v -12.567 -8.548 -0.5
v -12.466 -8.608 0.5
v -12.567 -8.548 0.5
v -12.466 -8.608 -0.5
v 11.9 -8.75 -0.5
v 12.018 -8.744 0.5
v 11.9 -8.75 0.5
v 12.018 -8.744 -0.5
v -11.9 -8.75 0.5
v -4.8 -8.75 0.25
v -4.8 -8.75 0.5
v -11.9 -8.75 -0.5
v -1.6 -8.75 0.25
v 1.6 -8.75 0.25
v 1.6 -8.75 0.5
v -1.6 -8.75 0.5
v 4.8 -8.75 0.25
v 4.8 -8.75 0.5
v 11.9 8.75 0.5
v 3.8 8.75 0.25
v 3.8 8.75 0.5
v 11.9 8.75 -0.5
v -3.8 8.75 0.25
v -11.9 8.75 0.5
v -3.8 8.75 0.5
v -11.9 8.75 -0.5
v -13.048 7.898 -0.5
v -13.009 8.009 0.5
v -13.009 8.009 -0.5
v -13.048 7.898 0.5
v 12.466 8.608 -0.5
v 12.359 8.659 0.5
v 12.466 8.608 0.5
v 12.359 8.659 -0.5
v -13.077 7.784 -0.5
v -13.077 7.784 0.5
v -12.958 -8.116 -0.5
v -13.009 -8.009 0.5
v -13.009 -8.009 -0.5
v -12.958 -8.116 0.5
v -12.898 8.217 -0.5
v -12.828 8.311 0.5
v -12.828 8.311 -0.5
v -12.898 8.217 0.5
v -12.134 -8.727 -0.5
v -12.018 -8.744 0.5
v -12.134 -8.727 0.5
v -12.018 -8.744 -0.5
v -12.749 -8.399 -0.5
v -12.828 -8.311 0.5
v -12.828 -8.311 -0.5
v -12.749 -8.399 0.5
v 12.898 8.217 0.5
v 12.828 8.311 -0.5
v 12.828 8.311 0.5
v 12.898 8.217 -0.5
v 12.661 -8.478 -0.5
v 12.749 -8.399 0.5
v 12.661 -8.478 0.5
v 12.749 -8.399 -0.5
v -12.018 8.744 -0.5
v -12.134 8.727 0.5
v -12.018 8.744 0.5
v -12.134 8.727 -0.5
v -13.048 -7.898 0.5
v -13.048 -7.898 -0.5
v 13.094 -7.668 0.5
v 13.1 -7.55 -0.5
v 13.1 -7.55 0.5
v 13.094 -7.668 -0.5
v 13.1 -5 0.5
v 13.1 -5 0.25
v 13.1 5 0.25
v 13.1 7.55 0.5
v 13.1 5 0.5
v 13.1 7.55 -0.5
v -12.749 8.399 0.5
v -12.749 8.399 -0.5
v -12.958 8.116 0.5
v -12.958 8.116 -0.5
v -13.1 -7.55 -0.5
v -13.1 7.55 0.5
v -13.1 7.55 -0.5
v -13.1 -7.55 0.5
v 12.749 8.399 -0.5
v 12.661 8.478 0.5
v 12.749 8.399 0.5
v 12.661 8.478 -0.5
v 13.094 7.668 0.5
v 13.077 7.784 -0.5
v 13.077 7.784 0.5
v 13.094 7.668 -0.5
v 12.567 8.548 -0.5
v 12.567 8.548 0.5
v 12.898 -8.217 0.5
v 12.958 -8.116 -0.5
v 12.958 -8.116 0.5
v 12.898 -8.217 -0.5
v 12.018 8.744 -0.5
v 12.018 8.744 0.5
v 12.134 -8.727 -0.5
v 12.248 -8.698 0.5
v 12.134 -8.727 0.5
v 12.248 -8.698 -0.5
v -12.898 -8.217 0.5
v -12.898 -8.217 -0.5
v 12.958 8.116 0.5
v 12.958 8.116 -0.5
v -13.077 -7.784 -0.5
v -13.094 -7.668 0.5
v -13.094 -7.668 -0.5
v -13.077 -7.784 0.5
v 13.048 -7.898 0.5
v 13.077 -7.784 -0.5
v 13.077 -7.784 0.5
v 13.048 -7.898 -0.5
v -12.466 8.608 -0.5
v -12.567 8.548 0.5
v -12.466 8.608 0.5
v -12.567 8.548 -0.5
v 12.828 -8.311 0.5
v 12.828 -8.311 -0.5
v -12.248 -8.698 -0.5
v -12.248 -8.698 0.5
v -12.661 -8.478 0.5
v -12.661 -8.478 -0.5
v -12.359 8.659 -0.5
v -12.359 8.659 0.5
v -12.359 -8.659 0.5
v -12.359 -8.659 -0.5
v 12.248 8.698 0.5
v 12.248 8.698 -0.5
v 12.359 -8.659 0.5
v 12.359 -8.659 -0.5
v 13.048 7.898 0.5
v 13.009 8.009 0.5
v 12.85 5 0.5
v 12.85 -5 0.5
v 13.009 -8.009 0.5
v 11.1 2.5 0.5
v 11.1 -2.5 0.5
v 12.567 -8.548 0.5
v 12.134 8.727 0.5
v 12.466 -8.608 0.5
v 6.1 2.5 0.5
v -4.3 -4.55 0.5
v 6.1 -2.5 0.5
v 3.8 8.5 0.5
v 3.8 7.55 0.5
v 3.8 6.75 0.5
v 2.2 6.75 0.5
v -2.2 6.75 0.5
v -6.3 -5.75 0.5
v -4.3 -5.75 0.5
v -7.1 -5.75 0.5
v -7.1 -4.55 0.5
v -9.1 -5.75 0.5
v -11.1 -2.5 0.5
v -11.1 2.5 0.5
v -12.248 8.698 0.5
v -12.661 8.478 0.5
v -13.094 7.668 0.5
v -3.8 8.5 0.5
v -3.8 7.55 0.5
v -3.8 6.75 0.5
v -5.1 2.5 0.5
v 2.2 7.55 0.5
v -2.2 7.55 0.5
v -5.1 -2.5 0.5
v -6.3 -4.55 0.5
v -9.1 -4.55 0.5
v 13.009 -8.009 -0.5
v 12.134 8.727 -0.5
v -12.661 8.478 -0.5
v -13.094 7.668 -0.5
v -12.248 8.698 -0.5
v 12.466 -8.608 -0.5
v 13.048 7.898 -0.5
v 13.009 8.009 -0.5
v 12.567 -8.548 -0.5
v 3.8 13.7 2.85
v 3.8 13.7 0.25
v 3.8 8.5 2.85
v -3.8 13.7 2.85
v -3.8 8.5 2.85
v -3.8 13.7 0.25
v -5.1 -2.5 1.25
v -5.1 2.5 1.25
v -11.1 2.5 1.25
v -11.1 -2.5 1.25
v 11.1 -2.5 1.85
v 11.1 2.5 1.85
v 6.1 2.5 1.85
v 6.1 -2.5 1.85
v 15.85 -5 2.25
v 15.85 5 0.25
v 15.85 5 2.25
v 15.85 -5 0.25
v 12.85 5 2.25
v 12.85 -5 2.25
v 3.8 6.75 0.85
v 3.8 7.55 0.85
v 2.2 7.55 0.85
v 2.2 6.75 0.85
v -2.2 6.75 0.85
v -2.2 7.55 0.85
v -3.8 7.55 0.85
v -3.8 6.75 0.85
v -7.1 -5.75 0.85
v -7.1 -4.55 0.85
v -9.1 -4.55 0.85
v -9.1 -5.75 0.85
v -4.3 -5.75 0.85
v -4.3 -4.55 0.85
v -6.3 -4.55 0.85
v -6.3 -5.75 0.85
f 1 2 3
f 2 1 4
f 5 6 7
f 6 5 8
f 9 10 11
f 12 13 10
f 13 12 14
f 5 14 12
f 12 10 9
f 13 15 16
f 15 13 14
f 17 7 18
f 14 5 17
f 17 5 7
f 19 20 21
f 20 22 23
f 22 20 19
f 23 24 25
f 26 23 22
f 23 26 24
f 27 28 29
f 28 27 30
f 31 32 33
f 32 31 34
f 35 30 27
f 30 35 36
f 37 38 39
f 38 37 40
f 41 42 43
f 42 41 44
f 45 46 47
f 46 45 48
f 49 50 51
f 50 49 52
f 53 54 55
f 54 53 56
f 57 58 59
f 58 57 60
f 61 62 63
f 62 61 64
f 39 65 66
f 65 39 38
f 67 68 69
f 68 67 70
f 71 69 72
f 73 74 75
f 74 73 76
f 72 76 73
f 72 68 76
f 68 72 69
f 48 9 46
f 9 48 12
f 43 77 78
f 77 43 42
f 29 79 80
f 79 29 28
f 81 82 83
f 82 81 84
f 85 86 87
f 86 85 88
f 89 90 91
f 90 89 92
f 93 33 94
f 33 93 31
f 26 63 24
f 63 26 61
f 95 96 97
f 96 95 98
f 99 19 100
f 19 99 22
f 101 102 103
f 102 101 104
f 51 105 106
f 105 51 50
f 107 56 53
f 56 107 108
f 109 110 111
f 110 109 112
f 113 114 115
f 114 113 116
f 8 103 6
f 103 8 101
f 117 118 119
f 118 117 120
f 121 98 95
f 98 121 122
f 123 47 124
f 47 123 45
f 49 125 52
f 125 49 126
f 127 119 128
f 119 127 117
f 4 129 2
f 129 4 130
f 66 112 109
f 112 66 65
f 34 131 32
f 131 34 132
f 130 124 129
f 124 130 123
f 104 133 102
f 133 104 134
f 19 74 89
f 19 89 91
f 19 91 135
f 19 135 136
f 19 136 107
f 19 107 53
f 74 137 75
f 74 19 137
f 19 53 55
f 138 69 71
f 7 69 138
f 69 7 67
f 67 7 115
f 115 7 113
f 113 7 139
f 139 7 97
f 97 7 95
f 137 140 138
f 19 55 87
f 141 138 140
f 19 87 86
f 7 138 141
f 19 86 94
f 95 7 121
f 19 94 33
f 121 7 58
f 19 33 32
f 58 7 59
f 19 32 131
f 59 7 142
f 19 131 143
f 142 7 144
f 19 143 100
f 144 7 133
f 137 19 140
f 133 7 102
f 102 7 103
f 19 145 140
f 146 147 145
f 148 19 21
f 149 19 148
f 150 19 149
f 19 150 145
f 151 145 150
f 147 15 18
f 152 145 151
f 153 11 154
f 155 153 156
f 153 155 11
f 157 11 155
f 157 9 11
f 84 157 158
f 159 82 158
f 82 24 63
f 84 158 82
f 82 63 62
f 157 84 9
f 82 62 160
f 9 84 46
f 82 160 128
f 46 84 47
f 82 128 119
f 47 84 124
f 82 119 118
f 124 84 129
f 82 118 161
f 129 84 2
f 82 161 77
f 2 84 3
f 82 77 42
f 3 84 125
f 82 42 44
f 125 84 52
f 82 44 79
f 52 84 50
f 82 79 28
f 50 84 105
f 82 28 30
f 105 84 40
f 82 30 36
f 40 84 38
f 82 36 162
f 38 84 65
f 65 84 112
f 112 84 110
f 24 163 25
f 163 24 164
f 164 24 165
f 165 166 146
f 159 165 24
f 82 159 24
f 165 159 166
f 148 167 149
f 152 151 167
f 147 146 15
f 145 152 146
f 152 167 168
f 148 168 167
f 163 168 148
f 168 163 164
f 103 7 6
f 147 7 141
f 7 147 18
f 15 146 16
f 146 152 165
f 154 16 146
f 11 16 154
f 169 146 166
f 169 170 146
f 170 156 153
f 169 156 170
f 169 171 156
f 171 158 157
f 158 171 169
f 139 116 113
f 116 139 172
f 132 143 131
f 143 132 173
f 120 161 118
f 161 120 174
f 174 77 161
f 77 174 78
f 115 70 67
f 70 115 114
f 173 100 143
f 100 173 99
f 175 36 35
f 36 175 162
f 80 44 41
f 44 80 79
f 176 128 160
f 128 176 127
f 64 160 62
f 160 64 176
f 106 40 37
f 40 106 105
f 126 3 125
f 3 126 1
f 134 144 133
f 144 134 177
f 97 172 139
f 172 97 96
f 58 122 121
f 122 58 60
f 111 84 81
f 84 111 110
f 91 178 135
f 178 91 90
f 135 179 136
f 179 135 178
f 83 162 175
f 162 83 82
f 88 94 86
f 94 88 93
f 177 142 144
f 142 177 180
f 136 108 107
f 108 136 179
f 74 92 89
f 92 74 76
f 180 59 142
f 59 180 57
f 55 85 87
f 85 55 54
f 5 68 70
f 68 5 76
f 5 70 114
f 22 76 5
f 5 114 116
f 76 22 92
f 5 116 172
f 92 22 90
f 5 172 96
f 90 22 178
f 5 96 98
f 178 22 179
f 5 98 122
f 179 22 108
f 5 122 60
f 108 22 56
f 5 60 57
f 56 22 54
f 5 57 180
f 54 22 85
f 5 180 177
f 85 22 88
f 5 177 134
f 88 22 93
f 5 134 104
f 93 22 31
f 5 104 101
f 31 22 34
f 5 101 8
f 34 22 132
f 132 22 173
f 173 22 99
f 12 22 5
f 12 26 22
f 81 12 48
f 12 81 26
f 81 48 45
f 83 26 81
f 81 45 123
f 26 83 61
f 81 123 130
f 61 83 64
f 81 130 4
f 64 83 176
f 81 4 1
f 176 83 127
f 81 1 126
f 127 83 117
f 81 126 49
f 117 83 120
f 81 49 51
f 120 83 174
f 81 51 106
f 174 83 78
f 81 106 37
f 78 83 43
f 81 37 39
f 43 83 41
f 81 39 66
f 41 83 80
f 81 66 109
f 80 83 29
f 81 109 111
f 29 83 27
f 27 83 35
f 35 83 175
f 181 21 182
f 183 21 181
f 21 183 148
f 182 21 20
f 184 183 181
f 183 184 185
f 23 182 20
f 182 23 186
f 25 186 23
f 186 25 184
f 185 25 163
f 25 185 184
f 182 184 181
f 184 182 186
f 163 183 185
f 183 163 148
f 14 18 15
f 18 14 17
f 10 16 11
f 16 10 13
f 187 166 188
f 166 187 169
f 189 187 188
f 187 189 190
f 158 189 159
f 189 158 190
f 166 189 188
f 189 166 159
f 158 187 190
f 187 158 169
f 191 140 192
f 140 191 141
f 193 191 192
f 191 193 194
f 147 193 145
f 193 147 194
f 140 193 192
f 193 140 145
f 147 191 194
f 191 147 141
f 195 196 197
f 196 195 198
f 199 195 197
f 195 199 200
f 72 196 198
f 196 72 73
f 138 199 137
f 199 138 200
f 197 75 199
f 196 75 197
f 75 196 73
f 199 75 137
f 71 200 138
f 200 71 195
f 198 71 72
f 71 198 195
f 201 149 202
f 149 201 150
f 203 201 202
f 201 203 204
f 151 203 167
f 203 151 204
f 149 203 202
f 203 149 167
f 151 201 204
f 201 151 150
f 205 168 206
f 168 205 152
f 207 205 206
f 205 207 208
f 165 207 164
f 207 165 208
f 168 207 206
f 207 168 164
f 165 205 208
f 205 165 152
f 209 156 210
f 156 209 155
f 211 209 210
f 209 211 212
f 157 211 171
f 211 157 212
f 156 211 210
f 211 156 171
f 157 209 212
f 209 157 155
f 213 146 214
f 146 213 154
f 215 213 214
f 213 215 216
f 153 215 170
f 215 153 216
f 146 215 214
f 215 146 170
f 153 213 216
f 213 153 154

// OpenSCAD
$fn = 64;

// Target overall PCB size (verifiable)
pcb_L = 26.2;
pcb_W = 17.5;
pcb_T = 1.0;

// Connectivity / robustness
corner_r = 1.2;
overlap  = 0.25;   // ensures all features intersect the PCB (one connected solid)

// --- Feature sizes (charger-module cues) ---
usb_W = 7.6;   // micro-USB shell width
usb_D = 5.2;   // protrusion beyond PCB edge
usb_H = 2.6;   // height above PCB

chip_L = 6.0;
chip_W = 5.0;
chip_H = 1.0;

ind_L = 5.0;
ind_W = 5.0;
ind_H = 1.6;

pad_L = 3.2;
pad_W = 2.2;
pad_H = 0.25;

header_L = 10.0;
header_W = 3.0;
header_H = 2.0;

// Extra recognizable details (still connected)
led_L = 1.6;
led_W = 0.8;
led_H = 0.6;

res_L = 2.0;
res_W = 1.2;
res_H = 0.6;

module rounded_pcb(L, W, T, r) {
    // Exact outer size L x W, thickness T
    linear_extrude(height=T, center=true)
        offset(r=r)
            square([L - 2*r, W - 2*r], center=true);
}

module block(sz=[1,1,1]) { cube(sz, center=true); }

module battery_charger_module() {
    union() {
        // PCB body (exact 26.2 x 17.5 x 1.0)
        rounded_pcb(pcb_L, pcb_W, pcb_T, corner_r);

        // Micro-USB-like connector on +Y edge (connected)
        translate([0,
                   pcb_W/2 + usb_D/2 - overlap,
                   pcb_T/2 + usb_H/2 - overlap])
            block([usb_W, usb_D, usb_H]);

        // Small "tongue" inside USB (still one solid; just a cue)
        tongue_W = usb_W * 0.55;
        tongue_D = usb_D * 0.55;
        tongue_H = 0.8;
        translate([0,
                   pcb_W/2 + tongue_D/2 - overlap,
                   pcb_T/2 + tongue_H/2 - overlap])
            block([tongue_W, tongue_D, tongue_H]);

        // 2-pin battery pads on -Y edge (connected)
        pad_y = -(pcb_W/2 - pad_W/2);
        pad_z = pcb_T/2 + pad_H/2 - overlap;
        pad_x_off = 3.2;
        translate([ pad_x_off, pad_y, pad_z]) block([pad_L, pad_W, pad_H]);
        translate([-pad_x_off, pad_y, pad_z]) block([pad_L, pad_W, pad_H]);

        // Small IC on top (connected)
        chip_x = -(pcb_L/2 - (chip_L/2 + 2.0));
        translate([chip_x,
                   0,
                   pcb_T/2 + chip_H/2 - overlap])
            block([chip_L, chip_W, chip_H]);

        // Inductor / larger component on top (connected)
        ind_x = (pcb_L/2 - (ind_L/2 + 2.0));
        translate([ind_x,
                   0,
                   pcb_T/2 + ind_H/2 - overlap])
            block([ind_L, ind_W, ind_H]);

        // Side header block along +X edge (connected)
        translate([pcb_L/2 + header_W/2 - overlap,
                   0,
                   pcb_T/2 + header_H/2 - overlap])
            block([header_W, header_L, header_H]);

        // Two small LEDs near +Y edge (connected)
        led_y = pcb_W/2 - (led_W/2 + 1.2);
        led_z = pcb_T/2 + led_H/2 - overlap;
        led_x_off = 3.0;
        translate([ led_x_off, led_y, led_z]) block([led_L, led_W, led_H]);
        translate([-led_x_off, led_y, led_z]) block([led_L, led_W, led_H]);

        // Two resistors near IC (connected)
        res_y = -(pcb_W/2 - (res_W/2 + 3.0));
        res_z = pcb_T/2 + res_H/2 - overlap;
        translate([chip_x, res_y, res_z]) block([res_L, res_W, res_H]);
        translate([chip_x + (res_L + 0.8), res_y, res_z]) block([res_L, res_W, res_H]);
    }
}

// Render
color([0.0, 0.4, 0.2])
battery_charger_module();
